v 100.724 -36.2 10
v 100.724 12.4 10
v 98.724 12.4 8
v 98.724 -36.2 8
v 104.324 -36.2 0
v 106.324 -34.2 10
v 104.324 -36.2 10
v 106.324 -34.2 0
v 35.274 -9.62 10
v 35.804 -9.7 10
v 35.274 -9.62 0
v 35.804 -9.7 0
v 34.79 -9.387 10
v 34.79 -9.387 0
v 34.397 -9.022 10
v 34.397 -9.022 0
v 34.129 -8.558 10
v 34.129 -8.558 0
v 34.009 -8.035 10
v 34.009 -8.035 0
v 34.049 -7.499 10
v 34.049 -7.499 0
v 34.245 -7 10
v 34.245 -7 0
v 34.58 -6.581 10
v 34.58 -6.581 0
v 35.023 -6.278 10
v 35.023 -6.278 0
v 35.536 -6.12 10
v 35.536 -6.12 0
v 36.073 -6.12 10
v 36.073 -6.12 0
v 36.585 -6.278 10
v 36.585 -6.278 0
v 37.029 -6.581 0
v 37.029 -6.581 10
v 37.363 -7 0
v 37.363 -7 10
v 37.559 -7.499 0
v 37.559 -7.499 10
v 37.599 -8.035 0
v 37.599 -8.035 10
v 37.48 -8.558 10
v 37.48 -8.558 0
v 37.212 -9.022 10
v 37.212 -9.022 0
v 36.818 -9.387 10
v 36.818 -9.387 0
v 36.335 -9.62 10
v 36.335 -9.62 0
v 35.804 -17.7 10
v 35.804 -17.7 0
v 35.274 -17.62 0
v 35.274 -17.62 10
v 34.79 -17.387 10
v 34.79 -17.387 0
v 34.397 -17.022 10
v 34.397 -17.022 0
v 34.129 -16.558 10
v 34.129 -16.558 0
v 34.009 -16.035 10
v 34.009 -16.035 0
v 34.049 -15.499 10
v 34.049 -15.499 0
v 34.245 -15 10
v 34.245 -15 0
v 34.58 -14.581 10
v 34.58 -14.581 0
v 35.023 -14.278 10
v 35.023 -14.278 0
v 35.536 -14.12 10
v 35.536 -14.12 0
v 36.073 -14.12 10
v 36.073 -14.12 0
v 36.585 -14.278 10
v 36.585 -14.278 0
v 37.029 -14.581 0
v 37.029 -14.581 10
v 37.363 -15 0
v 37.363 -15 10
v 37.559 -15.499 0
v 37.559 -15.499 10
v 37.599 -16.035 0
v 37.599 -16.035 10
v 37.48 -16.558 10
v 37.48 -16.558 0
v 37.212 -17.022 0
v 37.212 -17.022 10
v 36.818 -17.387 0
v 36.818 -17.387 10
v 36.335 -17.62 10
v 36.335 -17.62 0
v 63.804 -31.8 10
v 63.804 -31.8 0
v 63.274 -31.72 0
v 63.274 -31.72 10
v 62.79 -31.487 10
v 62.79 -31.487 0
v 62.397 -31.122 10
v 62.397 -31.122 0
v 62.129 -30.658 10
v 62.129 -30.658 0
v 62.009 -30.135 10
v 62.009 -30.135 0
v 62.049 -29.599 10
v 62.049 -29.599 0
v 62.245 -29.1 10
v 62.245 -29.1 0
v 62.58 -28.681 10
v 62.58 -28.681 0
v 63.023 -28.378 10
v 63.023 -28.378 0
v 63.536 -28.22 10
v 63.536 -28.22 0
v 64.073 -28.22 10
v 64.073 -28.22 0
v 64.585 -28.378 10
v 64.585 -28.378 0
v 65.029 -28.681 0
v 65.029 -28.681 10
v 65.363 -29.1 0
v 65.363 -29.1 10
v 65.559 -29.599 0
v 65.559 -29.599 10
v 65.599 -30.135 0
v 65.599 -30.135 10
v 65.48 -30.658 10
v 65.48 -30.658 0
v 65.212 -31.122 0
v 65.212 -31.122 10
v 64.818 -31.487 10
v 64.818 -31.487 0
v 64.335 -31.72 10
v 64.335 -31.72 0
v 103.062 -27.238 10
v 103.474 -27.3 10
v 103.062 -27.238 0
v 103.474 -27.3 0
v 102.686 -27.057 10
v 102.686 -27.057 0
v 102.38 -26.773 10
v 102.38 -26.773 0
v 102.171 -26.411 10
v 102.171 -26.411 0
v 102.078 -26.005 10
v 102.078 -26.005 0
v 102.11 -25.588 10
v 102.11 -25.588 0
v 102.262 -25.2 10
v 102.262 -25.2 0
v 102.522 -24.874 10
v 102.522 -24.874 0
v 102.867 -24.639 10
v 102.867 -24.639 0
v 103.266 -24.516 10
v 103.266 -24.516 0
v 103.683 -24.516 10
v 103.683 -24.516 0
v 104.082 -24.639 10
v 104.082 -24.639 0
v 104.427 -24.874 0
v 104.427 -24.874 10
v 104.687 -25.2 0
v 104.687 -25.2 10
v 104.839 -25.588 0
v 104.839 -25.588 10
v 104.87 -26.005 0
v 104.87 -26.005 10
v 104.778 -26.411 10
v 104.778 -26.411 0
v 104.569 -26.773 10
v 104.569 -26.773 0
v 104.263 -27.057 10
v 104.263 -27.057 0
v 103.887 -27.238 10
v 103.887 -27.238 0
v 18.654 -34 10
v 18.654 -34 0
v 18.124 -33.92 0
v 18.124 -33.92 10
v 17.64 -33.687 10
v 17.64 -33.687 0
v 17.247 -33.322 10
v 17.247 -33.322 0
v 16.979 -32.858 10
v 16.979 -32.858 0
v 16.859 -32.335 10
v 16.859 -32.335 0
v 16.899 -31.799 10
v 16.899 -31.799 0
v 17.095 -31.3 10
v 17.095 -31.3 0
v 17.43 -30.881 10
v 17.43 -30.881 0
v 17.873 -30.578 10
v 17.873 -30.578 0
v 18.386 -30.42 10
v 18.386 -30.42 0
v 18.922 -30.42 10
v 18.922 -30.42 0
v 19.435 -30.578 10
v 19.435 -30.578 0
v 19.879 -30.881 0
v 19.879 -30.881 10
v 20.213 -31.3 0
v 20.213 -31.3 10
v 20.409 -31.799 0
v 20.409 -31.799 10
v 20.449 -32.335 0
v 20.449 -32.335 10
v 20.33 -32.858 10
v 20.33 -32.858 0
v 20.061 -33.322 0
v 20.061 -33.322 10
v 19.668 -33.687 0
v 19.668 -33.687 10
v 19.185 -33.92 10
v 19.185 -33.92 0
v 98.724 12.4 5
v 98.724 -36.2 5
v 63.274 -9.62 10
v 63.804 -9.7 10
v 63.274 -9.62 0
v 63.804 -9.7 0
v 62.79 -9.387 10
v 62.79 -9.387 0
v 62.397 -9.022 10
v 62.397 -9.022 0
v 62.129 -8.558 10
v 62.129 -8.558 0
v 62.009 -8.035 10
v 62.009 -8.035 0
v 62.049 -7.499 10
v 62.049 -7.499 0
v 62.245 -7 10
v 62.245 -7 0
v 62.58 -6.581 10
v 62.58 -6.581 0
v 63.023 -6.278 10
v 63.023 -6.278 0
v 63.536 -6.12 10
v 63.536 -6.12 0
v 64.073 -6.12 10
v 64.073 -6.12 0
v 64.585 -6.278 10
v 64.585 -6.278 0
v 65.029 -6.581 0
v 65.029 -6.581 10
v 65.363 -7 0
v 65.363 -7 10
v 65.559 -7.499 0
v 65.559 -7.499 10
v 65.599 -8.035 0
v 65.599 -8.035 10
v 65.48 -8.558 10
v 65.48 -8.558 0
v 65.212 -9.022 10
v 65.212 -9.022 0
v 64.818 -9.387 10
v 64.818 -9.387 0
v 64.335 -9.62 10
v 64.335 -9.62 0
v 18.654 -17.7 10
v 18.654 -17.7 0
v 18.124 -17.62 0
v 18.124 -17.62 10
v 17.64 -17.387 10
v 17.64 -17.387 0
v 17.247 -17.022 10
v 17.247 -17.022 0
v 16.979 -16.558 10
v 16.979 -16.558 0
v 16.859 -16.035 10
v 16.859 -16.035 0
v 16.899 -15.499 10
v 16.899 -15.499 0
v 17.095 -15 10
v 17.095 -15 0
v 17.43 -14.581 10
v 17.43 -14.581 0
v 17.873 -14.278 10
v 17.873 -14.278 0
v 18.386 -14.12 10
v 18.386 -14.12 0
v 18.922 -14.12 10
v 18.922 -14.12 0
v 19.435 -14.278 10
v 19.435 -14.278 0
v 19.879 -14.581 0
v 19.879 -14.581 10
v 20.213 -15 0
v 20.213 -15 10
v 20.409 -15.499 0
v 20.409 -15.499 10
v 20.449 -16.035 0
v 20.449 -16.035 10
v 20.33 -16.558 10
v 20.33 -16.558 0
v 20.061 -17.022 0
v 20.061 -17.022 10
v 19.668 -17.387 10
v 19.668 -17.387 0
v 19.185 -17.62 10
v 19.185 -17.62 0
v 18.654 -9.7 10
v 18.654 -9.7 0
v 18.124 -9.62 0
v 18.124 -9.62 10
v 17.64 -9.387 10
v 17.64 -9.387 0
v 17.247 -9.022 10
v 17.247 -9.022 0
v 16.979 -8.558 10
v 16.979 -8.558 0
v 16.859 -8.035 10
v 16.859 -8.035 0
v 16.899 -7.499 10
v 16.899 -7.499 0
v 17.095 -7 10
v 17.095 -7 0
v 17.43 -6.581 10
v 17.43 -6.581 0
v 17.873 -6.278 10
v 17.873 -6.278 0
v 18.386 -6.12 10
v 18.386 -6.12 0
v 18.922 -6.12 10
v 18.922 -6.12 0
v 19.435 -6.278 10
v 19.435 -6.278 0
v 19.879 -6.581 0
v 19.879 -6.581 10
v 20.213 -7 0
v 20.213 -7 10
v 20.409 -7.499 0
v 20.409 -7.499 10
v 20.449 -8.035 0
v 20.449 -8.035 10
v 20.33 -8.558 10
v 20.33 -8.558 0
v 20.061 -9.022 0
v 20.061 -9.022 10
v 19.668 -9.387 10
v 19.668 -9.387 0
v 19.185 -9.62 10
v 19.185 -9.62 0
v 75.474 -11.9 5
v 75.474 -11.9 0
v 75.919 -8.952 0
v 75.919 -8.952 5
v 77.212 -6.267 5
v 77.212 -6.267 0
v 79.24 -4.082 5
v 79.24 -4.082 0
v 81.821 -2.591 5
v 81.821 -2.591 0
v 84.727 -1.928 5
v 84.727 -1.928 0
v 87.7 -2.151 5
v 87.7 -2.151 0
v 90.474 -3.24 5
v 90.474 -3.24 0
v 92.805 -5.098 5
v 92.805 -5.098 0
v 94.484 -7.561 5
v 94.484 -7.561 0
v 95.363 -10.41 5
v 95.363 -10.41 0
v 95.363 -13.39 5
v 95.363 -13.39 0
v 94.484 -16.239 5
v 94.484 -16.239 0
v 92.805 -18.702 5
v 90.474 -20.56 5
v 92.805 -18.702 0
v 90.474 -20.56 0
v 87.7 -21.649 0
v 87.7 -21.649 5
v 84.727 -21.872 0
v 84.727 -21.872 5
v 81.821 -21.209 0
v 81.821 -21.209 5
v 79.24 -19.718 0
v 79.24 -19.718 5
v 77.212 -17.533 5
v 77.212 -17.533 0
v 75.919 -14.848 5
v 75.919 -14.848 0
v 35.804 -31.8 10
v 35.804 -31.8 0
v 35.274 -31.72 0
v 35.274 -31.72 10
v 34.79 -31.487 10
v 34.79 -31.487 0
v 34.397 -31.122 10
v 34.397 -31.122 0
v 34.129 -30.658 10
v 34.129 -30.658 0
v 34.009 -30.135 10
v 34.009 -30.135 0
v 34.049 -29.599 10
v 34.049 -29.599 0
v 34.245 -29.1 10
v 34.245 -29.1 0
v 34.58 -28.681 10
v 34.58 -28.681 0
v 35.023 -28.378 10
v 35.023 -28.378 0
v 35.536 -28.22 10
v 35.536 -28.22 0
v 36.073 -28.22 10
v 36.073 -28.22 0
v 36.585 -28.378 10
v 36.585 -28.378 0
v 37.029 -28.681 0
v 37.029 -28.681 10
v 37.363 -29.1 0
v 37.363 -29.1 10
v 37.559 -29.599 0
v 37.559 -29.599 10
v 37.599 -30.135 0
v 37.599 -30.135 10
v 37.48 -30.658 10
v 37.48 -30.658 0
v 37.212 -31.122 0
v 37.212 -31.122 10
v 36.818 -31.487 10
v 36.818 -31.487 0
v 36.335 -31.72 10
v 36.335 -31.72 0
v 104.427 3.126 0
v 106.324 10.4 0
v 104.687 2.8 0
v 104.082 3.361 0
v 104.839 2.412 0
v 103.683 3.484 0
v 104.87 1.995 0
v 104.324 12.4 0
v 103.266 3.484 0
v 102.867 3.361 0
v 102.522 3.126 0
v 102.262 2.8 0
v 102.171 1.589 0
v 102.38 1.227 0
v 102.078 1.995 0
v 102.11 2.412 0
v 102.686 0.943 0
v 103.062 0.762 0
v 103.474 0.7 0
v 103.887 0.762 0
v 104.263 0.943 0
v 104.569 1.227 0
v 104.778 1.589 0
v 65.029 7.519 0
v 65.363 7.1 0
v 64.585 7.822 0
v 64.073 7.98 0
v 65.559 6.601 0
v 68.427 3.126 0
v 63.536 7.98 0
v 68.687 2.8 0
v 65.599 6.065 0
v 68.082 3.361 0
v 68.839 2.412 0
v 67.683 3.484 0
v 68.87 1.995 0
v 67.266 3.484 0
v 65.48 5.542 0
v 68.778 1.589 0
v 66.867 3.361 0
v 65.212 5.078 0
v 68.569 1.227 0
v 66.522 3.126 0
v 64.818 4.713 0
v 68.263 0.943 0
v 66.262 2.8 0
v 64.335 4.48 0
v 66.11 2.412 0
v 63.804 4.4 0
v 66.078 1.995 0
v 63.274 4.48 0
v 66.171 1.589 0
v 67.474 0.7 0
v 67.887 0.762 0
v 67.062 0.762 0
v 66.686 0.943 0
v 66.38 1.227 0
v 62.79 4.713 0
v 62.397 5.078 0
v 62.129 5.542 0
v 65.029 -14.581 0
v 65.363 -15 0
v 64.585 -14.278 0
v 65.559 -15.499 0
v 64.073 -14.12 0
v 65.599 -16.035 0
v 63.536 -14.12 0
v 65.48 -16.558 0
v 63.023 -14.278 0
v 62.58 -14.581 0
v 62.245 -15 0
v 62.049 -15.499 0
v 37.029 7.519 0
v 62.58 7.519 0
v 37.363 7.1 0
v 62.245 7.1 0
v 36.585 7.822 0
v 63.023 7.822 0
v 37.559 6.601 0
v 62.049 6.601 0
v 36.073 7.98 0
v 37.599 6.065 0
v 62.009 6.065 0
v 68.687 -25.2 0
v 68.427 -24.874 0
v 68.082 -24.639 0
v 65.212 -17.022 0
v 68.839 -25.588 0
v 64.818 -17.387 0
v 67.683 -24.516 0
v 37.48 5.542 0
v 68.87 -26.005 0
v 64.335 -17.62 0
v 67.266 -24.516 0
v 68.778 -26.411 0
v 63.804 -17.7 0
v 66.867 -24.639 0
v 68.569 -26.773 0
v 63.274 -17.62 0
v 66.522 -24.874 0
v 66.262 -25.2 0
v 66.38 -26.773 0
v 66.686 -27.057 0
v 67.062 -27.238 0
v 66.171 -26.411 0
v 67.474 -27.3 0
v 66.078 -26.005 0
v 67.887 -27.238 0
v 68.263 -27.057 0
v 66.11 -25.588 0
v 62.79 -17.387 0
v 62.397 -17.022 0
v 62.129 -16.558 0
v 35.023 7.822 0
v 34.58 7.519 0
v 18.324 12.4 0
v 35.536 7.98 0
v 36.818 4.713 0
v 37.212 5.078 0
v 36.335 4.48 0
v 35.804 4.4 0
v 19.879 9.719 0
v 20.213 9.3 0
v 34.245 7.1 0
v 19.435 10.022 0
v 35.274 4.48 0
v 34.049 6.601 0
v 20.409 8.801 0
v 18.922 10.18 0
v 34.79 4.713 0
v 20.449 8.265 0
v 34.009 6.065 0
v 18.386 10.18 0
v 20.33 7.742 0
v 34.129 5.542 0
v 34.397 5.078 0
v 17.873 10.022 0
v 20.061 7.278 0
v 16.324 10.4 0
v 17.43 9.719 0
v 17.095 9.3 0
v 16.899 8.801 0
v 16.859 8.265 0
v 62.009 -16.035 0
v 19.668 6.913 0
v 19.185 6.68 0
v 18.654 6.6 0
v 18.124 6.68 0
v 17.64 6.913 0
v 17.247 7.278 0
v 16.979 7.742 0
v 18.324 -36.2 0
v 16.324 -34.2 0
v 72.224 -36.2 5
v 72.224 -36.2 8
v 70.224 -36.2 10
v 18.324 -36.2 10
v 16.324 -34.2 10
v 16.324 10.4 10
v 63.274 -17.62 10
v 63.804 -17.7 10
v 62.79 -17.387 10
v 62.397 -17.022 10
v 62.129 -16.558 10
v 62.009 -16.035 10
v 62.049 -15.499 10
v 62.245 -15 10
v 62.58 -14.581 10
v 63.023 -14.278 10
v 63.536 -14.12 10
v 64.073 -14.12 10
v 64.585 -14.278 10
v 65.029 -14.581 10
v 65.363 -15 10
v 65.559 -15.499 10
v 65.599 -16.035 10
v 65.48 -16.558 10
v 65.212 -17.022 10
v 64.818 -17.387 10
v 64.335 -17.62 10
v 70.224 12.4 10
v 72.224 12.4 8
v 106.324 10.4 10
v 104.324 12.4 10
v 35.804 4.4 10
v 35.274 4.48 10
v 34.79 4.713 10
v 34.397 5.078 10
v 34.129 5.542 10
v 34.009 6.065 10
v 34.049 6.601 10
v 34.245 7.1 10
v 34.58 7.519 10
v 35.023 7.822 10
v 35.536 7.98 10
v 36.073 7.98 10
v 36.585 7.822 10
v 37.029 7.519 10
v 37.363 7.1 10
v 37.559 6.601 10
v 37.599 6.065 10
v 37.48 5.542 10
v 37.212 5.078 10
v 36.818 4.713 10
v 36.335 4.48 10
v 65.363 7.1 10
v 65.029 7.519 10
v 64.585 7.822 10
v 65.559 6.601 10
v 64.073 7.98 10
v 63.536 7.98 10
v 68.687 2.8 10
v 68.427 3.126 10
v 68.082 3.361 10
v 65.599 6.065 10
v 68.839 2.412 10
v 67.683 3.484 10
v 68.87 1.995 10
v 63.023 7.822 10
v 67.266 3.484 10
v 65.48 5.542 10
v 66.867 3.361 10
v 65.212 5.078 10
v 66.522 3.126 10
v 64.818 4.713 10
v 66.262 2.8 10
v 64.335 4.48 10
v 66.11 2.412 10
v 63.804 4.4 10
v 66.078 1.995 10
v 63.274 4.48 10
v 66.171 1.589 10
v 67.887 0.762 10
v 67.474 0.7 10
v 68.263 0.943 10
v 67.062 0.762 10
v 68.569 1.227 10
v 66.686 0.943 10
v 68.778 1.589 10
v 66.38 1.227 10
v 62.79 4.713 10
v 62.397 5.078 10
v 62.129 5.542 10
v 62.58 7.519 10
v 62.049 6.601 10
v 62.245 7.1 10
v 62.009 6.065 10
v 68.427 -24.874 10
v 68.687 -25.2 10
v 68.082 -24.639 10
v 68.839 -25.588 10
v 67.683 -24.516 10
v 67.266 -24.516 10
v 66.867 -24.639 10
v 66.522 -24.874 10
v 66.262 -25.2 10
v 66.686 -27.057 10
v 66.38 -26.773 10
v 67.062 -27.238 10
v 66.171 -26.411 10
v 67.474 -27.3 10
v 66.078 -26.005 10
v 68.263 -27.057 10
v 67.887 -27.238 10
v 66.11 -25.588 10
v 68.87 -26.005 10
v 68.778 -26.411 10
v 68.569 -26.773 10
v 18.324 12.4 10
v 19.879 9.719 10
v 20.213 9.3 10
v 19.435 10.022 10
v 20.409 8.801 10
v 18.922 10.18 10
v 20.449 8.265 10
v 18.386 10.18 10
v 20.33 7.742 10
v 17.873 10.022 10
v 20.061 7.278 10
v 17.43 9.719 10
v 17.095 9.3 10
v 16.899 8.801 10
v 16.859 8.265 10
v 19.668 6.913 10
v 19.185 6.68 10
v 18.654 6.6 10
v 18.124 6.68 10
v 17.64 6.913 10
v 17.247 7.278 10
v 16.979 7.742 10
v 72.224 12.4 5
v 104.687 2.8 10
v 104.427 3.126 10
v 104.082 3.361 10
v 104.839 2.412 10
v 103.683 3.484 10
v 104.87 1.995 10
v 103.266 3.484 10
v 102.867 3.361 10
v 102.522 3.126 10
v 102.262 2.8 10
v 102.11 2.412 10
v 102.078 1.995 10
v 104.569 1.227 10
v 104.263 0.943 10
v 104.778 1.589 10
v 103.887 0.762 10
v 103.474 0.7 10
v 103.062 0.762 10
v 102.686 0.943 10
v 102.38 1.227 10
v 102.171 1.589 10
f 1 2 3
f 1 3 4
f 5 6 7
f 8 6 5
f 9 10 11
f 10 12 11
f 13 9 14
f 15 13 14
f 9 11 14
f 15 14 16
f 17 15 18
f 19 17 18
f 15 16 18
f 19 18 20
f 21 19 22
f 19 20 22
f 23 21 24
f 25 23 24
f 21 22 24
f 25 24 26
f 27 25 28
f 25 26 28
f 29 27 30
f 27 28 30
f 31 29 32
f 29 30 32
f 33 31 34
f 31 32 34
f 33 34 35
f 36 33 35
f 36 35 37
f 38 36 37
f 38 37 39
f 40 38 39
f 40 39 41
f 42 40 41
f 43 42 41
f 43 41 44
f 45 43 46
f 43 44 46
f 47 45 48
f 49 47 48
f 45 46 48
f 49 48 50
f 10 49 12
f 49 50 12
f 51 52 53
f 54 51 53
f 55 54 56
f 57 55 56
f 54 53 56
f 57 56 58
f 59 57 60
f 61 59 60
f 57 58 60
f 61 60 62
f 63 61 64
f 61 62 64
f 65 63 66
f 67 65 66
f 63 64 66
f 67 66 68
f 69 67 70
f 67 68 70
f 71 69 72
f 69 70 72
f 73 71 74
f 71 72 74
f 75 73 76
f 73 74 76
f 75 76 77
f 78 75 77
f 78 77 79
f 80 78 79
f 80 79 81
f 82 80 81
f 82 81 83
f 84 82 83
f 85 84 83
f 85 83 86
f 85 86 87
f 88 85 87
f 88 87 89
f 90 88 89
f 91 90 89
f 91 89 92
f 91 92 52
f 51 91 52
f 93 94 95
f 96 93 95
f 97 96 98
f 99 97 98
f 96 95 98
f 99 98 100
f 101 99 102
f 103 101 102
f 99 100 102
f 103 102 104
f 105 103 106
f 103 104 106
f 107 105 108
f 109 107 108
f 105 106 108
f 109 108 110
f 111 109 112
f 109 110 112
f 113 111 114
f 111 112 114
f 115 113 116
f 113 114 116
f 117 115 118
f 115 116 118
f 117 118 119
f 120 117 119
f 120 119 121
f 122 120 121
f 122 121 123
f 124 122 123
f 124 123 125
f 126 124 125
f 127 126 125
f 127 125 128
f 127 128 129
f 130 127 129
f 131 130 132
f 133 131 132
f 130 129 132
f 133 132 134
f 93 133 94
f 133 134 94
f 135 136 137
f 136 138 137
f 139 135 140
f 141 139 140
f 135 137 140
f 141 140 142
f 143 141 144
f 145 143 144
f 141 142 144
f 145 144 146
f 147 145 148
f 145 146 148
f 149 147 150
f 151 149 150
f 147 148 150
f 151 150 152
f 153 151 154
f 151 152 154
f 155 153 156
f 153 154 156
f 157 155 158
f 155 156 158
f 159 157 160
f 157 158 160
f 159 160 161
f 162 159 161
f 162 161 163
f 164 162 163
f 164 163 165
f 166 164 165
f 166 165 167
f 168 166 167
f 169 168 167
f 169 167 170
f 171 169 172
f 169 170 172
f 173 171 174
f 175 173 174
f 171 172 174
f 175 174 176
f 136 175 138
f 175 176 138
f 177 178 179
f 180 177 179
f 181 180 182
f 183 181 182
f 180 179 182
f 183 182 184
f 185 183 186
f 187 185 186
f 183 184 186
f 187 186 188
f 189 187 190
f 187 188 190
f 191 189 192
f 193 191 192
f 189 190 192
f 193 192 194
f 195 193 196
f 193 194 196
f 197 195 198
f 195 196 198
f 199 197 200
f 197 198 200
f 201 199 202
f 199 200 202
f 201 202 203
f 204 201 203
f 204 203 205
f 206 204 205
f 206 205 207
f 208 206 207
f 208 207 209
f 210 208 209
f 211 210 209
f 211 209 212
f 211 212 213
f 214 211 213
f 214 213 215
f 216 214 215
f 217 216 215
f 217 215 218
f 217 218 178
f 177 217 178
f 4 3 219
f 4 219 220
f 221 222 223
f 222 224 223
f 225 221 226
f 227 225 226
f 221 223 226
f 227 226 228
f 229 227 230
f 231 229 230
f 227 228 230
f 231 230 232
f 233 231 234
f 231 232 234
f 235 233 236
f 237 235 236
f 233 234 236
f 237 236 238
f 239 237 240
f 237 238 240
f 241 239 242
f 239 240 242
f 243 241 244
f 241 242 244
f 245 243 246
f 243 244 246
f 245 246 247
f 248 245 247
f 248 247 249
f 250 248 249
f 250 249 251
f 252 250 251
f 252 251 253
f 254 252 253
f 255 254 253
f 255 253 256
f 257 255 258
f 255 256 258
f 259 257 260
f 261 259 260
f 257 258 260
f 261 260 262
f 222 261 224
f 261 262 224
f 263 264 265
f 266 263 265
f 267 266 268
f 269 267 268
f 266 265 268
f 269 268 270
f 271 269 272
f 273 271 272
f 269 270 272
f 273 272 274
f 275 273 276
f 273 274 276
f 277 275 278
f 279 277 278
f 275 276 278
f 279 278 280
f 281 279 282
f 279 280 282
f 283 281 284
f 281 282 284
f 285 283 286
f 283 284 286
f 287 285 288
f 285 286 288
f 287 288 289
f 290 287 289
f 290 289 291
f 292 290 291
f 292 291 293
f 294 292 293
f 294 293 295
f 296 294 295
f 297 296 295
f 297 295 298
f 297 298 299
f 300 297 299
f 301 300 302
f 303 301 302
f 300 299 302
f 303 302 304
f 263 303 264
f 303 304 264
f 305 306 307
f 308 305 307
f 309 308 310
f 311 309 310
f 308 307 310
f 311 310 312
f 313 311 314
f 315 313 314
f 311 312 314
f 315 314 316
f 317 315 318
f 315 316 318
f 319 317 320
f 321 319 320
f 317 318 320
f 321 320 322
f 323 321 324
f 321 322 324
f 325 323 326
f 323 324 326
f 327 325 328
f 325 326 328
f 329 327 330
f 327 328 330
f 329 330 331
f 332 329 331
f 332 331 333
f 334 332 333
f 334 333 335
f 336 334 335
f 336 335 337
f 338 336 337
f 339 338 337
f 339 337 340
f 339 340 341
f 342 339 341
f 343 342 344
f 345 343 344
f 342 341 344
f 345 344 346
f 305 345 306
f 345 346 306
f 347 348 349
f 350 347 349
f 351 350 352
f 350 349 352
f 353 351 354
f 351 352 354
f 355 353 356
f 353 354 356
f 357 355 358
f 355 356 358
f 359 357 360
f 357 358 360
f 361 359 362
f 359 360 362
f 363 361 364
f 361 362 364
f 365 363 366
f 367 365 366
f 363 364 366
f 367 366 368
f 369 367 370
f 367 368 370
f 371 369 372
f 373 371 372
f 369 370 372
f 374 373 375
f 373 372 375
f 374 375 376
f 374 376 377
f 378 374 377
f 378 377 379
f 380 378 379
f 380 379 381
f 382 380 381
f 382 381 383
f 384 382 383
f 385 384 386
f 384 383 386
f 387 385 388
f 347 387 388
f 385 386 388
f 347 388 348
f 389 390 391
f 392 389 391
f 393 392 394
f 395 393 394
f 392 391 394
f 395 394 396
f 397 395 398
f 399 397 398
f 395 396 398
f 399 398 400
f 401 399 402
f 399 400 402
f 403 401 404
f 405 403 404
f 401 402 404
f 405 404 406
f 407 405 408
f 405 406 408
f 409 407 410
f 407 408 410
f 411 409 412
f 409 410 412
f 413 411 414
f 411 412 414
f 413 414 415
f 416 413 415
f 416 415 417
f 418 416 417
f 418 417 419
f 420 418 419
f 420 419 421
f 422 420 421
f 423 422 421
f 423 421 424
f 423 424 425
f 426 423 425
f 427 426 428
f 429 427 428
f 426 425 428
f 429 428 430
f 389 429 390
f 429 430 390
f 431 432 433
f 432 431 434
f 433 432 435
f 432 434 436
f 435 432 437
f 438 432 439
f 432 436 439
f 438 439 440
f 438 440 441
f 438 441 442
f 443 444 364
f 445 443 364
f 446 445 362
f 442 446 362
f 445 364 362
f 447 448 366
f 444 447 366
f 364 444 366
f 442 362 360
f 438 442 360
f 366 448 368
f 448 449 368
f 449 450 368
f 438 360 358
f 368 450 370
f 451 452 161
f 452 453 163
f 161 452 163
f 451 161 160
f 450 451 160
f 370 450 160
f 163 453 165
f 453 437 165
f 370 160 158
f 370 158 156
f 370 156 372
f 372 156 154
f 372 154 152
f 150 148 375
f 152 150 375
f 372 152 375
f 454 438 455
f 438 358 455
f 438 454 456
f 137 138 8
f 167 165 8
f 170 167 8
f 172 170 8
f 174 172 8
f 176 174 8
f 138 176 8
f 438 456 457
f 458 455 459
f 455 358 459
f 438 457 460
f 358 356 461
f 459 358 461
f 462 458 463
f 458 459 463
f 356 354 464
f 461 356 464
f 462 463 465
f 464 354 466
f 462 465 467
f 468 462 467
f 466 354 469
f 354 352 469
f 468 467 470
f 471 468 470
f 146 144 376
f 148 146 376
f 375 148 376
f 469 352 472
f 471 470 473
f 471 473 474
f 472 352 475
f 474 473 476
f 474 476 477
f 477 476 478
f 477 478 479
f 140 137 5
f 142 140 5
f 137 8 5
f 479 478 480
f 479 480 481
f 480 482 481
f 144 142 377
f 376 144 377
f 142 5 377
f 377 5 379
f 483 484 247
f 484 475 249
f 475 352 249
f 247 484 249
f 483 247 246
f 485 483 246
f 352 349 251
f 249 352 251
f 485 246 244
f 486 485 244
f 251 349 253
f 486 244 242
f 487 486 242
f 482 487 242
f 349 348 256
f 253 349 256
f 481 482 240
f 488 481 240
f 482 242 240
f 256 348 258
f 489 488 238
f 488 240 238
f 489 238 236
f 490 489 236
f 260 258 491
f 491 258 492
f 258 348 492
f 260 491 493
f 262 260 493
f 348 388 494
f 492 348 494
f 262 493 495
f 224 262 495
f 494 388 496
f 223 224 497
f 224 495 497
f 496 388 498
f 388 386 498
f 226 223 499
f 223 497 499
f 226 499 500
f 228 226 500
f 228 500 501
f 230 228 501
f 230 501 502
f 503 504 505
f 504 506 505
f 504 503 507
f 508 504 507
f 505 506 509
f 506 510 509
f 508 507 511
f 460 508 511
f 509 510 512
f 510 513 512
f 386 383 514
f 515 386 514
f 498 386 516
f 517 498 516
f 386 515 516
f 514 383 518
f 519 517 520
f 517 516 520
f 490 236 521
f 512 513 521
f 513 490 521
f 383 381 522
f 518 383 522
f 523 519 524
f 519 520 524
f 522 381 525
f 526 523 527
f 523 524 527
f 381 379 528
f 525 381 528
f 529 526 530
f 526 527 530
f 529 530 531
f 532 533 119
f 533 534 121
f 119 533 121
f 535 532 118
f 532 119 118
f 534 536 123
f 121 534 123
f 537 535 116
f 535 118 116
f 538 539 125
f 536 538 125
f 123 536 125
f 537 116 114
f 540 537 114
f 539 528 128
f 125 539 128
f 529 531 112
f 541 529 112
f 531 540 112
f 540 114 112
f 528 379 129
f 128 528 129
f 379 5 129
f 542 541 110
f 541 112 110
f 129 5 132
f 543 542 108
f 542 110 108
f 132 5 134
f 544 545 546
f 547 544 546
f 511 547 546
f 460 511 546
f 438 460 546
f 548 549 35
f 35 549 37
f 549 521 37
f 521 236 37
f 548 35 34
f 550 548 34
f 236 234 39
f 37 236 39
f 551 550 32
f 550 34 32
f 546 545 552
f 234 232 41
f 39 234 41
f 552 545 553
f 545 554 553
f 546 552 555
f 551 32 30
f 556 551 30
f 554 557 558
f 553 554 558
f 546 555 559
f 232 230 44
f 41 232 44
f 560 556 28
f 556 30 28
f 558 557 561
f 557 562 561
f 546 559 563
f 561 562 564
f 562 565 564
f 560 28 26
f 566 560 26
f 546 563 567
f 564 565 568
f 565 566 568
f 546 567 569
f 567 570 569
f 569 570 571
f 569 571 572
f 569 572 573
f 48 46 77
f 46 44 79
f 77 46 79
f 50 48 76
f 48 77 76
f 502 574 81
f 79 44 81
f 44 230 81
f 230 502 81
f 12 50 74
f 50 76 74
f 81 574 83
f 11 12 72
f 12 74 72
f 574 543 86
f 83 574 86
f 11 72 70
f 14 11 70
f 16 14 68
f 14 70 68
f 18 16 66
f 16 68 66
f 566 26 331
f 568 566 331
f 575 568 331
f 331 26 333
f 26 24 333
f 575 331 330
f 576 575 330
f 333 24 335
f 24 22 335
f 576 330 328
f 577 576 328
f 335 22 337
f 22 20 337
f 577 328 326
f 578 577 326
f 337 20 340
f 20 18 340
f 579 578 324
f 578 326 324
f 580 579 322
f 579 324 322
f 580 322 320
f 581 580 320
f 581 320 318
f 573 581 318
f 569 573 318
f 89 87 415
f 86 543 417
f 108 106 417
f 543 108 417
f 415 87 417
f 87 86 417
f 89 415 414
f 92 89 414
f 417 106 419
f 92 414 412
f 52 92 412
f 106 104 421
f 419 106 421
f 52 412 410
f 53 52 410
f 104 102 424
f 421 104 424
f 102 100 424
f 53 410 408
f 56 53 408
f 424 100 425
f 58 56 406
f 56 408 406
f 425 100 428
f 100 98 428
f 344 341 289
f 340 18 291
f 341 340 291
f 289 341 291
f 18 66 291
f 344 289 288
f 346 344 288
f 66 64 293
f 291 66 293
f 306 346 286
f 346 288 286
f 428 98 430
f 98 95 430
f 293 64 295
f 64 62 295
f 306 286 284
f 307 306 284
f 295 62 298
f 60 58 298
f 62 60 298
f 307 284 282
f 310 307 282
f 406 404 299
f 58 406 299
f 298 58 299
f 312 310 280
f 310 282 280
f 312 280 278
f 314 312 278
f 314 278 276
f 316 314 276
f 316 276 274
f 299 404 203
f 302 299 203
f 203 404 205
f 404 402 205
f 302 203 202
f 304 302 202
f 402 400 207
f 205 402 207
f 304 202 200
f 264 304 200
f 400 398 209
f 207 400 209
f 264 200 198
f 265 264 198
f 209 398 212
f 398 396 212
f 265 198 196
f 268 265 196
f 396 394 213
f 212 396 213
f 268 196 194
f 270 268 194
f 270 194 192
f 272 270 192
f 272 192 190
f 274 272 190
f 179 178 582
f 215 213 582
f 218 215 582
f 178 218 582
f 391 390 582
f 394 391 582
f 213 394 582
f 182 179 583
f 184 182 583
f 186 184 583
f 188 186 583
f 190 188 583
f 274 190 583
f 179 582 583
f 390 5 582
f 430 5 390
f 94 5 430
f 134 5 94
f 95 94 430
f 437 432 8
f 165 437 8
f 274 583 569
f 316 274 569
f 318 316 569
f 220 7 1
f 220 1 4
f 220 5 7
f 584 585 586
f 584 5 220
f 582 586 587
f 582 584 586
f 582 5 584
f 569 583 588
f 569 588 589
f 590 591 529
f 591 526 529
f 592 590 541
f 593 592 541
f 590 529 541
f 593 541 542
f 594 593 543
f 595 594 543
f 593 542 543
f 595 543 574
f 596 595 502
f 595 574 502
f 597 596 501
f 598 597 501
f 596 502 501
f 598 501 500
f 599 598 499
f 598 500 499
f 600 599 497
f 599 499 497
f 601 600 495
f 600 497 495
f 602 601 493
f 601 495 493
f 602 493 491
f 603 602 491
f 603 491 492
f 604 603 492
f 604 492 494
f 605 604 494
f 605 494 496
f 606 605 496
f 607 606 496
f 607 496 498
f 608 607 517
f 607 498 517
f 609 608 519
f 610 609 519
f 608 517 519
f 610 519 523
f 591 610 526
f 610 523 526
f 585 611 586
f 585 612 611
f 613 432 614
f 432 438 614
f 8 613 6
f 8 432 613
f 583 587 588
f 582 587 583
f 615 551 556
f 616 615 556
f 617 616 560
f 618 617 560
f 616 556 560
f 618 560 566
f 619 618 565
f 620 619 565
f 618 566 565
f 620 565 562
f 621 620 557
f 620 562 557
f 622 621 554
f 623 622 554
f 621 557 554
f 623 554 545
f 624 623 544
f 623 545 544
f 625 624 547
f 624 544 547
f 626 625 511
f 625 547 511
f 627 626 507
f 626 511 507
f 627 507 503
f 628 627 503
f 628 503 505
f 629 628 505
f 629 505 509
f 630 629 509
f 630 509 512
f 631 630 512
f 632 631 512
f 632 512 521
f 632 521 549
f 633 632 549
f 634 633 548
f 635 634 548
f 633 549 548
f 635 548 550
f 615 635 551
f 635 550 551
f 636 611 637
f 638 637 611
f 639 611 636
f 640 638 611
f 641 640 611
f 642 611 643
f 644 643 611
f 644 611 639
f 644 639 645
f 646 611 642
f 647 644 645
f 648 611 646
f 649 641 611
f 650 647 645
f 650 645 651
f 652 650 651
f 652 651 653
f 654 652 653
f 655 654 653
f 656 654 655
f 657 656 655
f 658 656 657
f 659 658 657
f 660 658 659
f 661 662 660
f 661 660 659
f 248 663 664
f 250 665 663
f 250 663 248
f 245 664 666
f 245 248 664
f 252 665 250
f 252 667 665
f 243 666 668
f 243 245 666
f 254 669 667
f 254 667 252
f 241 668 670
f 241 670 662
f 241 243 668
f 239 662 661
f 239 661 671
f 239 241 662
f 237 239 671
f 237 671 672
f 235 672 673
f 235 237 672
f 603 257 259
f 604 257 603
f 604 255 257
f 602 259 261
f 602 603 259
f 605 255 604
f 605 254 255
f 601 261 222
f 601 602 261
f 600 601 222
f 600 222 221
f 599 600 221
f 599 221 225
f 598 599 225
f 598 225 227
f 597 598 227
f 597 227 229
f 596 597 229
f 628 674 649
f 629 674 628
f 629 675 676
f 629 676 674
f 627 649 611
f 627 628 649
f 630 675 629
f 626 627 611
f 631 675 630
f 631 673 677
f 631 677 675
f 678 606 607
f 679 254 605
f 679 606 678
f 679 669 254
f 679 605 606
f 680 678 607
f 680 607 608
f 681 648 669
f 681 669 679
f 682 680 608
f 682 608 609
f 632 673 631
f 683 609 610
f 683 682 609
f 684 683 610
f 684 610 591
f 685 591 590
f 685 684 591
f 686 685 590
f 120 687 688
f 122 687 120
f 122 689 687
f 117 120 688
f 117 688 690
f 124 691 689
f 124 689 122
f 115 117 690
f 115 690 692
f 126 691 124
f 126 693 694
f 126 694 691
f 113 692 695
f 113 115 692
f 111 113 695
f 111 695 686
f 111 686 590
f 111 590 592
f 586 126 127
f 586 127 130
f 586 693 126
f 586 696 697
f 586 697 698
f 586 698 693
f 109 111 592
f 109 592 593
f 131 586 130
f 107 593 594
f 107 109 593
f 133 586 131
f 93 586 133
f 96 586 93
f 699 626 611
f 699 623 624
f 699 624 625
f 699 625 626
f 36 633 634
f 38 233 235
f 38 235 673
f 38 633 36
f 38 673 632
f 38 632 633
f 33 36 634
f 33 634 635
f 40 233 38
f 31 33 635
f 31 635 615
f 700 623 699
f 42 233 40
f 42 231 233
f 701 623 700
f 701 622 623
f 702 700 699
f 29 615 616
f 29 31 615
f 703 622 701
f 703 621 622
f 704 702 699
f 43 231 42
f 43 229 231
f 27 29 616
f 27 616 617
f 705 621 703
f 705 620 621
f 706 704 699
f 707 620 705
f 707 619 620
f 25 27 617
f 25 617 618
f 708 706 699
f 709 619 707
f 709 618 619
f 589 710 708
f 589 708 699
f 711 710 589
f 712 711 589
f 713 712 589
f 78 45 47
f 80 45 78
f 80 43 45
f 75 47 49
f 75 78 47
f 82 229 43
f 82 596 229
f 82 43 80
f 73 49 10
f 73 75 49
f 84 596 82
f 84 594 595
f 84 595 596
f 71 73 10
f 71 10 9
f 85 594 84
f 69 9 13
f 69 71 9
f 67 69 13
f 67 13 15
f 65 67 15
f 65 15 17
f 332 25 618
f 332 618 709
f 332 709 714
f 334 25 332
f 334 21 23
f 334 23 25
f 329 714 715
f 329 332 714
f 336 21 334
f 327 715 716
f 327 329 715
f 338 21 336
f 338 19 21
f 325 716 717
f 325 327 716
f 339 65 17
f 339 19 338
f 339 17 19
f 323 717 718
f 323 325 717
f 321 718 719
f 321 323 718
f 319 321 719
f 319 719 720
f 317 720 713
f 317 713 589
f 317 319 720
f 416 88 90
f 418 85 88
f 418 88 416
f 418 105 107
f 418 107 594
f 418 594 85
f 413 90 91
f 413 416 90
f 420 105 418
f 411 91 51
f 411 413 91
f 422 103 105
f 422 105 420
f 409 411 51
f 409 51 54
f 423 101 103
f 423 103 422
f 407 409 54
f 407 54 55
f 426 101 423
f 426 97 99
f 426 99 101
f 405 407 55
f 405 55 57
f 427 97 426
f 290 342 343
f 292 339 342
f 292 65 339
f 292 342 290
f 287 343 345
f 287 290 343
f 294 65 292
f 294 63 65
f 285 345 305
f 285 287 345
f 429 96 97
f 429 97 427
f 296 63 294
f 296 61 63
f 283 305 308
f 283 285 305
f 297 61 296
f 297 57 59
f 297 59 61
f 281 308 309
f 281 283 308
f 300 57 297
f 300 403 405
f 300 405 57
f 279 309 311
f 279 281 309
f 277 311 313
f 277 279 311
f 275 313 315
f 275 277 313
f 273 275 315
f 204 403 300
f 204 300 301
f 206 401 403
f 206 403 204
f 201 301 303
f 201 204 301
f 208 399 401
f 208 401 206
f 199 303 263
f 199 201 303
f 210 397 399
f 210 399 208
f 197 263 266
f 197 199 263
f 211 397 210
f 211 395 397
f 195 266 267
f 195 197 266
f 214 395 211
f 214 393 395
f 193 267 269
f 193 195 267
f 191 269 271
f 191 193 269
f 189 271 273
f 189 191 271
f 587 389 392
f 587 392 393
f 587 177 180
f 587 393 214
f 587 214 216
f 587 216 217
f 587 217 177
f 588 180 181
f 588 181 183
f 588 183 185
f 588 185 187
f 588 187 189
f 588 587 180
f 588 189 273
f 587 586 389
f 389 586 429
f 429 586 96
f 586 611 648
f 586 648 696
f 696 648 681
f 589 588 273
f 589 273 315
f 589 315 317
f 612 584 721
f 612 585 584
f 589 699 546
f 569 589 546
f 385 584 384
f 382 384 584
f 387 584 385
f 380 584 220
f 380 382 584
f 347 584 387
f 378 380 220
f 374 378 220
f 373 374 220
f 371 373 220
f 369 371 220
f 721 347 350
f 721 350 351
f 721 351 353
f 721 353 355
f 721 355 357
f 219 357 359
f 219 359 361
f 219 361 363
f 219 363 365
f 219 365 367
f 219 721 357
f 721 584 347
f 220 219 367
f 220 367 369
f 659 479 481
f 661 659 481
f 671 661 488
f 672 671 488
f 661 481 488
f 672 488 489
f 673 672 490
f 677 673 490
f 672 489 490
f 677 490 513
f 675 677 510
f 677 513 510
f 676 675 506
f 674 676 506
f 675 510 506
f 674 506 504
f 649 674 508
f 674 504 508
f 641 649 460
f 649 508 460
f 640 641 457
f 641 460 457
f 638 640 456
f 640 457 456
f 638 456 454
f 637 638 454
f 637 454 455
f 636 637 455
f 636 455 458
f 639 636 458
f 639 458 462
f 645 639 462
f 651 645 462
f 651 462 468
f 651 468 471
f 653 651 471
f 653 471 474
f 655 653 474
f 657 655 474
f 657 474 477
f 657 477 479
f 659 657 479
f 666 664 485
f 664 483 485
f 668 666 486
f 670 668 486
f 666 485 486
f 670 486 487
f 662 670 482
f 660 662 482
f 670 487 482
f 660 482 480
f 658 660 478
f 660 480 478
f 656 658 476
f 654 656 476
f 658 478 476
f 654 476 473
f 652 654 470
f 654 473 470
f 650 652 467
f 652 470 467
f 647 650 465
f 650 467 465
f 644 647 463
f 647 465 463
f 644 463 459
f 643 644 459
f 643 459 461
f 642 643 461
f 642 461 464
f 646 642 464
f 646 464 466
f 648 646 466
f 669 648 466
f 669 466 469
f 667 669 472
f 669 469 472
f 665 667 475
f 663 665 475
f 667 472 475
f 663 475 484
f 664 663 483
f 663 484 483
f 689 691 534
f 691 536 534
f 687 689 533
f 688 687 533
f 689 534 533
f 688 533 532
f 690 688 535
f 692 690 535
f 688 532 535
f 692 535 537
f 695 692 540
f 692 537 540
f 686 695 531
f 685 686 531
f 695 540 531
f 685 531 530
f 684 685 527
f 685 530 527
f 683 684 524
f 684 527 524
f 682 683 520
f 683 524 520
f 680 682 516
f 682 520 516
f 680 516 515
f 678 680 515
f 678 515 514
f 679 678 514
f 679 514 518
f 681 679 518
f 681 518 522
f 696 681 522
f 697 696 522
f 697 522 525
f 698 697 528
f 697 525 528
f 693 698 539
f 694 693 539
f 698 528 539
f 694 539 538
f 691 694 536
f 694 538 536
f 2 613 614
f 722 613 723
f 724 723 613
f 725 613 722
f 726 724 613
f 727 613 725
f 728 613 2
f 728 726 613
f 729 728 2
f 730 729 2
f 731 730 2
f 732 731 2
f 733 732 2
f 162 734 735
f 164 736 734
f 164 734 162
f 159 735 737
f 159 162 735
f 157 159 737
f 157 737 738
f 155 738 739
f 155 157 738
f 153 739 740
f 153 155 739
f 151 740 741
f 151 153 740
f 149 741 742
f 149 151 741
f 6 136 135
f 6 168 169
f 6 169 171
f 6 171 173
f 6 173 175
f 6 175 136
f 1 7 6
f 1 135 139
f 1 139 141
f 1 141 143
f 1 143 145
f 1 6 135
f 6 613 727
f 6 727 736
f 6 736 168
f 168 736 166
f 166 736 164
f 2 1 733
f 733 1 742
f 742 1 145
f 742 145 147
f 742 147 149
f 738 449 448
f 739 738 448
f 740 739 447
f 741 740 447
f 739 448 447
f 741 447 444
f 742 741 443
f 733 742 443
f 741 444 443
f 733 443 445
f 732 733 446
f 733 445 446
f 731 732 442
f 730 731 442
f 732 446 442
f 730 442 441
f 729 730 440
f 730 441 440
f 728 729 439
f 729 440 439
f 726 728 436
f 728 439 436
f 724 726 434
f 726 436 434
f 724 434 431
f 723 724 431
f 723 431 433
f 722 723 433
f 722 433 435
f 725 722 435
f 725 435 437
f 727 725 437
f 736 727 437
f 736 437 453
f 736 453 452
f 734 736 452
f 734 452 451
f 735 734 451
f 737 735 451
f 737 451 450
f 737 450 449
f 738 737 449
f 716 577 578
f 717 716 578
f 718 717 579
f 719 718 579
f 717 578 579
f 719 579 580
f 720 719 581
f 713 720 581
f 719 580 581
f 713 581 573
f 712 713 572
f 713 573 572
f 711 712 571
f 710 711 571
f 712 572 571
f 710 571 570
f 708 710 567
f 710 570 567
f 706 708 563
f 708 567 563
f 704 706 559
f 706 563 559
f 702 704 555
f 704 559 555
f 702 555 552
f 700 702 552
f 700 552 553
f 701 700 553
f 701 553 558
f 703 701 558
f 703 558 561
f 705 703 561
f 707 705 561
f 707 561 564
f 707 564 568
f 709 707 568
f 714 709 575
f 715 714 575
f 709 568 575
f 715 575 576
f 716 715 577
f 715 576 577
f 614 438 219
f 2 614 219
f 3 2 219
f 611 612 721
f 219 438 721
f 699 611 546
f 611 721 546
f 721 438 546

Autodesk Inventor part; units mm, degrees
ref_plane "YZ Plane" through (0, 0, 0) normal (1, 0, 0) x (0, 1, 0)
ref_plane "XZ Plane" through (0, 0, 0) normal (0, 1, 0) x (-1, 0, 0)
ref_plane "XY Plane" through (0, 0, 0) normal (0, 0, 1) x (1, 0, 0)
ref_plane "Arbeitsebene1" through (0.2798, 48.6, 0) normal (0, 0, 1) x (1, 0, 0)
ref_plane "Arbeitsebene2" through (106.3244, 12.4, 0) normal (0, 0, 1) x (-1, 0, 0)
sketch "Skizze8" plane through (106.3244, 12.4, 0) normal (0, 0, 1) x (-1, 0, 0)
  circle A0 centre (8.6702, 4) radius 1.4 projected
  circle A1 centre (70.5201, 20.3) radius 1.4 projected
  circle A2 centre (8.6702, 20.3) radius 1.4 projected
  circle A3 centre (42.5201, 20.3) radius 1.4 projected
  circle A4 centre (42.5201, 6.2) radius 1.4 projected
  circle A5 centre (70.5201, 6.2) radius 1.4 projected
  circle A6 centre (87.6702, 20.3) radius 1.4 projected
  circle A7 centre (87.6702, 4) radius 1.4 projected
  line L0 (5, 0) -> (5, 24.3) projected
  line L1 (5, 0) -> (90, 0) projected
  line L2 (90, 24.3) -> (90, 0) projected
  line L3 (26.35, 24.3) -> (90, 24.3) projected
  arc A8 (15.35, 24.3) -> (26.35, 24.3) centre (20.85, 24.3) ccw projected
  line L4 (5, 24.3) -> (15.35, 24.3) projected
  circle A9 centre (8.6702, 44.6) radius 1.4 projected
  circle A10 centre (70.5201, 28.3) radius 1.4 projected
  circle A11 centre (8.6702, 28.3) radius 1.4 projected
  circle A12 centre (42.5201, 28.3) radius 1.4 projected
  circle A13 centre (42.5201, 42.4) radius 1.4 projected
  circle A14 centre (70.5201, 42.4) radius 1.4 projected
  circle A15 centre (87.6702, 28.3) radius 1.4 projected
  circle A16 centre (87.6702, 44.6) radius 1.4 projected
  line L5 (5, 48.6) -> (5, 24.3) projected
  line L6 (5, 24.3) -> (15.35, 24.3) projected
  arc A17 (26.35, 24.3) -> (15.35, 24.3) centre (20.85, 24.3) ccw projected
  line L7 (26.35, 24.3) -> (90, 24.3) projected
  line L8 (90, 24.3) -> (90, 48.6) projected
  line L9 (5, 48.6) -> (90, 48.6) projected
  line L10 (8.1, 62.05) -> (8.1, -13.45) projected
  circle A18 centre (20.85, 24.3) radius 10
  line L11 (5, 0) -> (0, 0)
  line L12 (0, 0) -> (0, 48.6)
  line L13 (0, 48.6) -> (5, 48.6)
  line L14 (5, 48.6) -> (5, 0)
  point P0 (106.3244, 12.4)
  point P1 (8.1, 48.6)
  point P2 (8.1, 45.8786)
  point P3 (8.1, 43.3214)
  point P4 (8.1, 29.5786)
  point P5 (8.1, 27.0214)
  point P6 (8.1, 21.5786)
  point P7 (8.1, 19.0214)
  point P8 (8.1, 5.2786)
  point P9 (8.1, 2.7214)
  point P10 (8.1, 0)
  dimension "d36" = 20
  dimension "d38" = 5
extrude "Extrusion6" add sketch "Skizze8" along normal blind 10 contours A0 L10 | A0 L10 A2 L4 A18 L3 L2 L1 | L10 A0 | A0 L10 L1 L0 L4 A2 | L10 A2 | A2 L10 | L11 L12 L13 L5 L0 | L10 A11 A9 L9 L8 L3 A18 L4 | L4 L5 L9 L10 A9 A11 | L10 A11 | A11 L10 | L10 A9 | A9 L10
sketch "Skizze9" plane through (106.3244, 12.4, 10) normal (0, 0, 1) x (1, 0, 0)
  arc A0 (-23.35, -48.1544) -> (-18.35, -48.1544) centre (-20.85, -49.3) ccw projected
  line L0 (-23.35, -48.1544) -> (-23.35, -0.4456) projected
  arc A1 (-18.35, -0.4456) -> (-23.35, -0.4456) centre (-20.85, 0.7) ccw projected
  line L1 (-18.35, -0.4456) -> (-18.35, -48.1544) projected
  line L2 (-33.6, 13.45) -> (-33.6, -62.05) projected
  line L3 (-33.6, -62.05) -> (-8.1, -62.05) projected
  line L4 (-8.1, -62.05) -> (-8.1, 13.45) projected
  line L5 (-8.1, 13.45) -> (-33.6, 13.45) projected
  line L6 (-34.1, -62.55) -> (-34.1, 13.95)
  line L7 (-34.1, 13.95) -> (-7.6, 13.95)
  line L8 (-7.6, 13.95) -> (-7.6, -62.55)
  line L9 (-7.6, -62.55) -> (-34.1, -62.55)
  point P0 (-106.3244, -12.4)
  dimension "d37" = 0.5
extrude "Extrusion7" cut sketch "Skizze9" against normal blind 5 contours L0 A1 L1 A0 | L5 L4 L3 L2 | L6 L7 L8 L9
chamfer "Fasen2" distance 2 angle 45 6 edges at (72.2244, -11.9, 10) (98.7244, -11.9, 10) (16.3244, -36.2, 5) (16.3244, 12.4, 5) (106.3244, 12.4, 5) (106.3244, -36.2, 5)
sketch "Skizze10" plane through (106.3244, 12.4, 10) normal (0, 0, 1) x (1, 0, 0)
  circle A0 centre (-87.6702, -44.6) radius 1.4 projected
  circle A1 centre (-70.5201, -42.4) radius 1.4 projected
  circle A2 centre (-42.5201, -28.3) radius 1.4 projected
  circle A3 centre (-70.5201, -28.3) radius 1.4 projected
  circle A4 centre (-42.5201, -42.4) radius 1.4 projected
  circle A5 centre (-87.6702, -28.3) radius 1.4 projected
  circle A6 centre (-70.5201, -20.3) radius 1.4 projected
  circle A7 centre (-42.5201, -20.3) radius 1.4 projected
  circle A8 centre (-42.5201, -6.2) radius 1.4 projected
  circle A9 centre (-70.5201, -6.2) radius 1.4 projected
  circle A10 centre (-87.6702, -20.3) radius 1.4 projected
  circle A11 centre (-87.6702, -4) radius 1.4 projected
  line L0 (-36.1, 0) -> (-36.1, -48.6) projected
  line L1 (-36.1, 0) -> (-88, 0) projected
  line L2 (-90, -2) -> (-90, -46.6) projected
  line L3 (-88, -48.6) -> (-36.1, -48.6) projected
  line L4 (-90, -2) -> (-88, 0) projected
  line L5 (-88, -48.6) -> (-90, -46.6) projected
  line L6 (0, -46.6) -> (-2, -48.6) projected
  line L7 (0, -46.6) -> (0, -2) projected
  line L8 (-2, 0) -> (0, -2) projected
  line L9 (-2, 0) -> (-5.6, 0) projected
  line L10 (-5.6, -48.6) -> (-5.6, 0) projected
  line L11 (-5.6, -48.6) -> (-2, -48.6) projected
  point P0 (-106.3244, -12.4)
hole "Bohrung3" at (18.6542, 8.4, 10) at (18.6542, -7.9, 10) at (18.6542, -32.2, 10) at (18.6542, -15.9, 10) at (35.8043, -15.9, 10) at (35.8043, -7.9, 10) at (35.8043, -30, 10) at (63.8043, -30, 10) at (63.8043, -15.9, 10) at (63.8043, -7.9, 10) at (63.8043, 6.2, 10) at (35.8043, 6.2, 10) direction (0, 0, -1) diameter 3.6 depth 15 tip angle 118
sketch "Skizze11" plane through (106.3244, 12.4, 10) normal (0, 0, 1) x (1, 0, 0)
  point P0 (-106.3244, -12.4)
sketch "Skizze12" plane through (106.3244, 12.4, 10) normal (0, 0, 1) x (1, 0, 0)
  circle A0 centre (-70.5201, -6.2) radius 1.8 projected
  circle A1 centre (-42.5201, -6.2) radius 1.8 projected
  circle A2 centre (-42.5201, -20.3) radius 1.8 projected
  circle A3 centre (-42.5201, -28.3) radius 1.8 projected
  circle A4 centre (-42.5201, -42.4) radius 1.8 projected
  circle A5 centre (-70.5201, -42.4) radius 1.8 projected
  circle A6 centre (-70.5201, -20.3) radius 1.8 projected
  circle A7 centre (-70.5201, -28.3) radius 1.8 projected
  circle A8 centre (-87.6702, -28.3) radius 1.8 projected
  circle A9 centre (-87.6702, -44.6) radius 1.8 projected
  circle A10 centre (-87.6702, -20.3) radius 1.8 projected
  circle A11 centre (-87.6702, -4) radius 1.8 projected
  line L0 (-36.1, 0) -> (-36.1, -48.6) projected
  line L1 (-36.1, 0) -> (-88, 0) projected
  line L2 (-90, -2) -> (-90, -46.6) projected
  line L3 (-88, -48.6) -> (-36.1, -48.6) projected
  circle A12 centre (-20.85, -24.3) radius 10 projected
  line L4 (-38.85, -38.3) -> (-2.85, -38.3)
  line L5 (-2.85, -38.3) -> (-2.85, -10.3)
  line L6 (-2.85, -10.3) -> (-38.85, -10.3)
  line L7 (-38.85, -10.3) -> (-38.85, -38.3)
  line L8 (-38.85, -38.3) -> (-2.85, -10.3) construction
  line L9 (-2.85, -38.3) -> (-38.85, -10.3) construction
  line L10 (-90, -2) -> (-88, 0) projected
  line L11 (-88, -48.6) -> (-90, -46.6) projected
  line L12 (0, -46.6) -> (-2, -48.6) projected
  line L13 (0, -46.6) -> (0, -2) projected
  line L14 (-2, 0) -> (0, -2) projected
  line L15 (-2, 0) -> (-5.6, 0) projected
  line L16 (-5.6, -48.6) -> (-5.6, 0) projected
  line L17 (-5.6, -48.6) -> (-2, -48.6) projected
  point P0 (-106.3244, -12.4)
  dimension "d51" = 36
  dimension "d52" = 28
hole "Bohrung4" at (67.4744, 2.1, 10) at (67.4744, -25.9, 10) at (103.4744, 2.1, 10) at (103.4744, -25.9, 10) direction (0, 0, -1) diameter 2.8 depth 15 tip angle 118
properties part number "60_Planktoscope_Sampleholder"
